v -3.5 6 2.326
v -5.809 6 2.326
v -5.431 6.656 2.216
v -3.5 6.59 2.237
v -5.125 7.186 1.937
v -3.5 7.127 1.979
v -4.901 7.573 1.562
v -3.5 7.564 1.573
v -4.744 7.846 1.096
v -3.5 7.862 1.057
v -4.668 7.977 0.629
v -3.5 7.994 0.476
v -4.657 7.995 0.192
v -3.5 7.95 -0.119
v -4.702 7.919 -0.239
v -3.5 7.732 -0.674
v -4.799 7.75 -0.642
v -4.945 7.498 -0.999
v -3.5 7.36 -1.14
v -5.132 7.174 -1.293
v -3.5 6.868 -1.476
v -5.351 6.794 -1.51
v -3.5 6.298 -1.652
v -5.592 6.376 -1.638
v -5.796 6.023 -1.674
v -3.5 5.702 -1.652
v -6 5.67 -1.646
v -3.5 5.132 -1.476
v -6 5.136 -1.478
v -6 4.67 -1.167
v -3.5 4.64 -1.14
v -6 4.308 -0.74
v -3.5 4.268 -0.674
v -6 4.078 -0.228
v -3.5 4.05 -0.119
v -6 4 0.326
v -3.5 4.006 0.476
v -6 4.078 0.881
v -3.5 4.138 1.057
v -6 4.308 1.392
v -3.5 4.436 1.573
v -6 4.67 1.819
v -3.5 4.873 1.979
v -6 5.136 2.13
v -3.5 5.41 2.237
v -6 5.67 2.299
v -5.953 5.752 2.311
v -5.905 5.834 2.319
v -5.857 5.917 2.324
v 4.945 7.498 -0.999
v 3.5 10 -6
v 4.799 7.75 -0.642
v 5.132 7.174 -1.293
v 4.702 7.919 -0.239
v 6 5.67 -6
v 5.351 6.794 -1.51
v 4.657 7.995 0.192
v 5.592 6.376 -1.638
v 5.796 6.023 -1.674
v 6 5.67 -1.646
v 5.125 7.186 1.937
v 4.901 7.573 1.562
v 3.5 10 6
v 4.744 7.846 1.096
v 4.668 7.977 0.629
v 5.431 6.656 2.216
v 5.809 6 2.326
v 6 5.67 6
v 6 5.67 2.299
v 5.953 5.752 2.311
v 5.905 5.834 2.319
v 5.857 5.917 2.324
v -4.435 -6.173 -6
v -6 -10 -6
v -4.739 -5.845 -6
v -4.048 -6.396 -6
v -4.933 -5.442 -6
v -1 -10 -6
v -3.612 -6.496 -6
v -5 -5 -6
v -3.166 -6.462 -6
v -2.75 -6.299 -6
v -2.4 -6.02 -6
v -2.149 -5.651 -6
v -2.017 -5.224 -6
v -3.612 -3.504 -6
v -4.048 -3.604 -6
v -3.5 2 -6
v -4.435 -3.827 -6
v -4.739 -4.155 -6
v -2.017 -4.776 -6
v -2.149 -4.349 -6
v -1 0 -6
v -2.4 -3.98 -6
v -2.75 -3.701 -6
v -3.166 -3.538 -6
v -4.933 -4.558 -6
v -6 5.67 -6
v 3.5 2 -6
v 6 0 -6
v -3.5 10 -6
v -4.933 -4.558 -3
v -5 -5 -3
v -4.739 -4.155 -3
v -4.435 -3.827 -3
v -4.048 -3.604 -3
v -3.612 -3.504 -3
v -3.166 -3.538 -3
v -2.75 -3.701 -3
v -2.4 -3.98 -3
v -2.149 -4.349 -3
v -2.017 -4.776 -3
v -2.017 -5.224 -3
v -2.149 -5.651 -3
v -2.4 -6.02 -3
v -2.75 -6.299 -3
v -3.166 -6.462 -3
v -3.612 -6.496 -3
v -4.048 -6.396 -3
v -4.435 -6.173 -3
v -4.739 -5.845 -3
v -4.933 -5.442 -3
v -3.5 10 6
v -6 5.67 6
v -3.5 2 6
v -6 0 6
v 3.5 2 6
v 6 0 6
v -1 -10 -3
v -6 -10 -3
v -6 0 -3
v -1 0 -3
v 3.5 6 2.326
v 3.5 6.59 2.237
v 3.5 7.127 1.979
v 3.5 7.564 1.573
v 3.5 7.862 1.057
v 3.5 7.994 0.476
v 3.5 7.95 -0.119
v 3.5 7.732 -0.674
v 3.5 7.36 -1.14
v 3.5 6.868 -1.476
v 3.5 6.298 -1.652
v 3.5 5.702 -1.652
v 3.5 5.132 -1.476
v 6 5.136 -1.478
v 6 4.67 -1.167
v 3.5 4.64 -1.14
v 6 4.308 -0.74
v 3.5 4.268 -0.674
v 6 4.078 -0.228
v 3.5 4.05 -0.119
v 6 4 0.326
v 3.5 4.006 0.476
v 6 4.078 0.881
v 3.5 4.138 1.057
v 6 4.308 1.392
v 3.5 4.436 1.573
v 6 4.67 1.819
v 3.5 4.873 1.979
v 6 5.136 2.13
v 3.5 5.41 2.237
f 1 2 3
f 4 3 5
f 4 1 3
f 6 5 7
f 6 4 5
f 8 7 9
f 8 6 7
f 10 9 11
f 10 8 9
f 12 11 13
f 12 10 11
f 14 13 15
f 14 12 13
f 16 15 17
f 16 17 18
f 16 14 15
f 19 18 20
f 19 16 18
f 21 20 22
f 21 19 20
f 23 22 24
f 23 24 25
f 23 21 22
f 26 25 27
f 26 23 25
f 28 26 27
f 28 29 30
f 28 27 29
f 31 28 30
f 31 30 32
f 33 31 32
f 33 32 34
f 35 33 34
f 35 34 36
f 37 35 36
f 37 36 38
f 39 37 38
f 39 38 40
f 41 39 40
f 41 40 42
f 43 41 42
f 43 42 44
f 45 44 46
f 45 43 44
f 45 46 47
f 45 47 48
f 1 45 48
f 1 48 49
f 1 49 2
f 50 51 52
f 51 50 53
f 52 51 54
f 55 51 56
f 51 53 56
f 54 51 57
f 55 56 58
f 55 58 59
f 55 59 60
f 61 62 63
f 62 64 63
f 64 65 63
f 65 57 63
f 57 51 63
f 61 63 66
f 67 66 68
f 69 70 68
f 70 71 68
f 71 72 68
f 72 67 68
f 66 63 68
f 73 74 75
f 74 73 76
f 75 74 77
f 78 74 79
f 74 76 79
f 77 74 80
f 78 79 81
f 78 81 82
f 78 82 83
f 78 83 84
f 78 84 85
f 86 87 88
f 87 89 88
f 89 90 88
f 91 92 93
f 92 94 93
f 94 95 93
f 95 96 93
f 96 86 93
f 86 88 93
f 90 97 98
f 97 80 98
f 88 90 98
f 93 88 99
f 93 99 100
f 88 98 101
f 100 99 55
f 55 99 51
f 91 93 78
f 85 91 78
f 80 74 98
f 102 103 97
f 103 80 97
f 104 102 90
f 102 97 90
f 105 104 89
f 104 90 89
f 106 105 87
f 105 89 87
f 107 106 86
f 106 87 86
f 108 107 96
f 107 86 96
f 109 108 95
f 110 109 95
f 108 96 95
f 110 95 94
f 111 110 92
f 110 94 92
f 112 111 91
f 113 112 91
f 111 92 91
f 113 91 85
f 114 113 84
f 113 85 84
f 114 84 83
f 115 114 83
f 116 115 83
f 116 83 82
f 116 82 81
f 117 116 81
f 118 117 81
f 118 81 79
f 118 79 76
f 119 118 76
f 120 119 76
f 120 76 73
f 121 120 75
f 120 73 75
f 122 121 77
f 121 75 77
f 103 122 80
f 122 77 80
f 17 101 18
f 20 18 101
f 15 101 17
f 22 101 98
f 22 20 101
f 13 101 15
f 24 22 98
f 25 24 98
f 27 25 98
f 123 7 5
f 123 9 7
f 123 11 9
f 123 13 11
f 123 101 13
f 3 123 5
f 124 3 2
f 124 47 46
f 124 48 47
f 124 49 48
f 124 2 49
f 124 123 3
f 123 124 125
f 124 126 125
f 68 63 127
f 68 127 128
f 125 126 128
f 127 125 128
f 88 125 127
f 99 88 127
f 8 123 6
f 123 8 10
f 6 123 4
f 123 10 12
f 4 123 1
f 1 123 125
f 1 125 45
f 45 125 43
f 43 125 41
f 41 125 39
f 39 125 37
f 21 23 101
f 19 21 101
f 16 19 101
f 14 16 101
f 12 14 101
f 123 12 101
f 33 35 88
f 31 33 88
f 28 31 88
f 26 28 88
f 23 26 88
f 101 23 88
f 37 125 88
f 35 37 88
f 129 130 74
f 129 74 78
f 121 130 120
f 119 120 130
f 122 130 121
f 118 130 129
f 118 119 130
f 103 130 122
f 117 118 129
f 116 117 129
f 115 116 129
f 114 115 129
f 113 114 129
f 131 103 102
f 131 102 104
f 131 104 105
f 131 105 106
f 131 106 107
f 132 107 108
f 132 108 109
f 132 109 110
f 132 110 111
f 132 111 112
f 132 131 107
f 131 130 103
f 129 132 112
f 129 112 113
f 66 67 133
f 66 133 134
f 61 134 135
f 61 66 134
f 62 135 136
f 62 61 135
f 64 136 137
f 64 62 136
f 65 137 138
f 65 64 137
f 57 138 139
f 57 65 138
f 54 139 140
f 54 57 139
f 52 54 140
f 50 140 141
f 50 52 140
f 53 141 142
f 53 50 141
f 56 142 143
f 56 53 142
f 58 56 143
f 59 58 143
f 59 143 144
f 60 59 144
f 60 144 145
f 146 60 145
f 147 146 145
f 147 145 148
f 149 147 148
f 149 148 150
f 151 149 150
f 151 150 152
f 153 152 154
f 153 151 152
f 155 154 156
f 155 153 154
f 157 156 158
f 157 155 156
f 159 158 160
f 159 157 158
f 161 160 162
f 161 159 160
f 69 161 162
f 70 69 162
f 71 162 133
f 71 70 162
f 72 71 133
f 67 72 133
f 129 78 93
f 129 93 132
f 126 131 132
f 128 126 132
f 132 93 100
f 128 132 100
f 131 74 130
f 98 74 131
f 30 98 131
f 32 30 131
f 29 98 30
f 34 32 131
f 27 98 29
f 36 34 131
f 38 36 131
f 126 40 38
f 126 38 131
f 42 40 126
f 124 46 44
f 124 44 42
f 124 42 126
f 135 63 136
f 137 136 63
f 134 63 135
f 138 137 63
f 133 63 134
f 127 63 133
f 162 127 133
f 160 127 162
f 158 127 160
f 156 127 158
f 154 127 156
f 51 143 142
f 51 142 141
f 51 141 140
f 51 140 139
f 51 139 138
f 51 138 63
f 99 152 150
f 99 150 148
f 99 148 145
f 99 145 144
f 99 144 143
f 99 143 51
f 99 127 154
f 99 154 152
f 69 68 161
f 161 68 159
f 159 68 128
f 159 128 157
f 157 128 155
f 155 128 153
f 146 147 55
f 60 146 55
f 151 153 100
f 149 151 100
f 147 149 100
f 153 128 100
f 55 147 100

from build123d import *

# Parameters (mm, degrees)
SKETCH1_W                 = 12
SKETCH1_H                 = 12
BOSS_EXTRUDE1_DEPTH       = 2
SKETCH2_W                 = 2.5
SKETCH2_H                 = 12
BOSS_EXTRUDE2_DEPTH       = 8
CUT_EXTRUDE1_DEPTH        = 17.733200531
CUT_EXTRUDE2_DEPTH        = 16.041608956
CUT_EXTRUDE2_DEPTH_BACK   = 16.041608956
SKETCH4_R                 = 2
SKETCH6_W                 = 5
SKETCH6_H                 = 3
BOSS_EXTRUDE3_DEPTH       = 10
F_3_0MM_DOWEL_HOLE1_D     = 3
F_3_0MM_DOWEL_HOLE1_DEPTH = 3
F_3_0MM_DOWEL_HOLE1_TIP   = 0.901290929


with BuildPart() as part:
    # Sketch1 → Boss-Extrude1 (new body)
    with BuildSketch(Plane(origin=(0, 0, 0), x_dir=(1, 0, 0), z_dir=(0, 1, 0))):
        Rectangle(SKETCH1_W, SKETCH1_H)
    extrude(amount=BOSS_EXTRUDE1_DEPTH)

    # Sketch2 → Boss-Extrude2 (add)
    with BuildSketch(Plane(origin=(0, 2, 0), x_dir=(1, 0, 0), z_dir=(0, 1, 0))):
        with Locations((-4.75, 0)):
            Rectangle(SKETCH2_W, SKETCH2_H)
        with Locations((4.75, 0)):
            Rectangle(SKETCH2_W, SKETCH2_H)
    extrude(amount=BOSS_EXTRUDE2_DEPTH)

    # Sketch5 → Cut-Extrude1 (cut, through all)
    with BuildSketch(Plane.XY.offset(6)):
        Polygon((-3.5, 10), (-6, 5.669872981), (-6, 10), align=None)
        Polygon((3.5, 10), (6, 5.669872981), (6, 10), align=None)
    extrude(amount=-CUT_EXTRUDE1_DEPTH, mode=Mode.SUBTRACT)

    # Sketch4 → Cut-Extrude2 (cut, two sides: drawn at the far end of the back side and taken through both)
    with BuildSketch(Plane.ZY.offset(-3.5).offset(-CUT_EXTRUDE2_DEPTH_BACK)):
        with Locations((0.326138493, 6)):
            Circle(SKETCH4_R)
    extrude(amount=CUT_EXTRUDE2_DEPTH + CUT_EXTRUDE2_DEPTH_BACK, mode=Mode.SUBTRACT)

    # Sketch6 → Boss-Extrude3 (add)
    with BuildSketch(Plane.XZ):
        with Locations((-3.5, -4.5)):
            Rectangle(SKETCH6_W, SKETCH6_H)
    extrude(amount=BOSS_EXTRUDE3_DEPTH)

    # Ø3.0mm Dowel Hole1
    with Locations(Plane.XY.offset(-3)):
        with Locations((-3.5, -5)):
            Hole(F_3_0MM_DOWEL_HOLE1_D / 2, depth=F_3_0MM_DOWEL_HOLE1_DEPTH)
            with Locations((0, 0, -(F_3_0MM_DOWEL_HOLE1_DEPTH + F_3_0MM_DOWEL_HOLE1_TIP / 2))):  # 118° drill point
                Cone(0, F_3_0MM_DOWEL_HOLE1_D / 2, F_3_0MM_DOWEL_HOLE1_TIP, mode=Mode.SUBTRACT)


solid = part.part
